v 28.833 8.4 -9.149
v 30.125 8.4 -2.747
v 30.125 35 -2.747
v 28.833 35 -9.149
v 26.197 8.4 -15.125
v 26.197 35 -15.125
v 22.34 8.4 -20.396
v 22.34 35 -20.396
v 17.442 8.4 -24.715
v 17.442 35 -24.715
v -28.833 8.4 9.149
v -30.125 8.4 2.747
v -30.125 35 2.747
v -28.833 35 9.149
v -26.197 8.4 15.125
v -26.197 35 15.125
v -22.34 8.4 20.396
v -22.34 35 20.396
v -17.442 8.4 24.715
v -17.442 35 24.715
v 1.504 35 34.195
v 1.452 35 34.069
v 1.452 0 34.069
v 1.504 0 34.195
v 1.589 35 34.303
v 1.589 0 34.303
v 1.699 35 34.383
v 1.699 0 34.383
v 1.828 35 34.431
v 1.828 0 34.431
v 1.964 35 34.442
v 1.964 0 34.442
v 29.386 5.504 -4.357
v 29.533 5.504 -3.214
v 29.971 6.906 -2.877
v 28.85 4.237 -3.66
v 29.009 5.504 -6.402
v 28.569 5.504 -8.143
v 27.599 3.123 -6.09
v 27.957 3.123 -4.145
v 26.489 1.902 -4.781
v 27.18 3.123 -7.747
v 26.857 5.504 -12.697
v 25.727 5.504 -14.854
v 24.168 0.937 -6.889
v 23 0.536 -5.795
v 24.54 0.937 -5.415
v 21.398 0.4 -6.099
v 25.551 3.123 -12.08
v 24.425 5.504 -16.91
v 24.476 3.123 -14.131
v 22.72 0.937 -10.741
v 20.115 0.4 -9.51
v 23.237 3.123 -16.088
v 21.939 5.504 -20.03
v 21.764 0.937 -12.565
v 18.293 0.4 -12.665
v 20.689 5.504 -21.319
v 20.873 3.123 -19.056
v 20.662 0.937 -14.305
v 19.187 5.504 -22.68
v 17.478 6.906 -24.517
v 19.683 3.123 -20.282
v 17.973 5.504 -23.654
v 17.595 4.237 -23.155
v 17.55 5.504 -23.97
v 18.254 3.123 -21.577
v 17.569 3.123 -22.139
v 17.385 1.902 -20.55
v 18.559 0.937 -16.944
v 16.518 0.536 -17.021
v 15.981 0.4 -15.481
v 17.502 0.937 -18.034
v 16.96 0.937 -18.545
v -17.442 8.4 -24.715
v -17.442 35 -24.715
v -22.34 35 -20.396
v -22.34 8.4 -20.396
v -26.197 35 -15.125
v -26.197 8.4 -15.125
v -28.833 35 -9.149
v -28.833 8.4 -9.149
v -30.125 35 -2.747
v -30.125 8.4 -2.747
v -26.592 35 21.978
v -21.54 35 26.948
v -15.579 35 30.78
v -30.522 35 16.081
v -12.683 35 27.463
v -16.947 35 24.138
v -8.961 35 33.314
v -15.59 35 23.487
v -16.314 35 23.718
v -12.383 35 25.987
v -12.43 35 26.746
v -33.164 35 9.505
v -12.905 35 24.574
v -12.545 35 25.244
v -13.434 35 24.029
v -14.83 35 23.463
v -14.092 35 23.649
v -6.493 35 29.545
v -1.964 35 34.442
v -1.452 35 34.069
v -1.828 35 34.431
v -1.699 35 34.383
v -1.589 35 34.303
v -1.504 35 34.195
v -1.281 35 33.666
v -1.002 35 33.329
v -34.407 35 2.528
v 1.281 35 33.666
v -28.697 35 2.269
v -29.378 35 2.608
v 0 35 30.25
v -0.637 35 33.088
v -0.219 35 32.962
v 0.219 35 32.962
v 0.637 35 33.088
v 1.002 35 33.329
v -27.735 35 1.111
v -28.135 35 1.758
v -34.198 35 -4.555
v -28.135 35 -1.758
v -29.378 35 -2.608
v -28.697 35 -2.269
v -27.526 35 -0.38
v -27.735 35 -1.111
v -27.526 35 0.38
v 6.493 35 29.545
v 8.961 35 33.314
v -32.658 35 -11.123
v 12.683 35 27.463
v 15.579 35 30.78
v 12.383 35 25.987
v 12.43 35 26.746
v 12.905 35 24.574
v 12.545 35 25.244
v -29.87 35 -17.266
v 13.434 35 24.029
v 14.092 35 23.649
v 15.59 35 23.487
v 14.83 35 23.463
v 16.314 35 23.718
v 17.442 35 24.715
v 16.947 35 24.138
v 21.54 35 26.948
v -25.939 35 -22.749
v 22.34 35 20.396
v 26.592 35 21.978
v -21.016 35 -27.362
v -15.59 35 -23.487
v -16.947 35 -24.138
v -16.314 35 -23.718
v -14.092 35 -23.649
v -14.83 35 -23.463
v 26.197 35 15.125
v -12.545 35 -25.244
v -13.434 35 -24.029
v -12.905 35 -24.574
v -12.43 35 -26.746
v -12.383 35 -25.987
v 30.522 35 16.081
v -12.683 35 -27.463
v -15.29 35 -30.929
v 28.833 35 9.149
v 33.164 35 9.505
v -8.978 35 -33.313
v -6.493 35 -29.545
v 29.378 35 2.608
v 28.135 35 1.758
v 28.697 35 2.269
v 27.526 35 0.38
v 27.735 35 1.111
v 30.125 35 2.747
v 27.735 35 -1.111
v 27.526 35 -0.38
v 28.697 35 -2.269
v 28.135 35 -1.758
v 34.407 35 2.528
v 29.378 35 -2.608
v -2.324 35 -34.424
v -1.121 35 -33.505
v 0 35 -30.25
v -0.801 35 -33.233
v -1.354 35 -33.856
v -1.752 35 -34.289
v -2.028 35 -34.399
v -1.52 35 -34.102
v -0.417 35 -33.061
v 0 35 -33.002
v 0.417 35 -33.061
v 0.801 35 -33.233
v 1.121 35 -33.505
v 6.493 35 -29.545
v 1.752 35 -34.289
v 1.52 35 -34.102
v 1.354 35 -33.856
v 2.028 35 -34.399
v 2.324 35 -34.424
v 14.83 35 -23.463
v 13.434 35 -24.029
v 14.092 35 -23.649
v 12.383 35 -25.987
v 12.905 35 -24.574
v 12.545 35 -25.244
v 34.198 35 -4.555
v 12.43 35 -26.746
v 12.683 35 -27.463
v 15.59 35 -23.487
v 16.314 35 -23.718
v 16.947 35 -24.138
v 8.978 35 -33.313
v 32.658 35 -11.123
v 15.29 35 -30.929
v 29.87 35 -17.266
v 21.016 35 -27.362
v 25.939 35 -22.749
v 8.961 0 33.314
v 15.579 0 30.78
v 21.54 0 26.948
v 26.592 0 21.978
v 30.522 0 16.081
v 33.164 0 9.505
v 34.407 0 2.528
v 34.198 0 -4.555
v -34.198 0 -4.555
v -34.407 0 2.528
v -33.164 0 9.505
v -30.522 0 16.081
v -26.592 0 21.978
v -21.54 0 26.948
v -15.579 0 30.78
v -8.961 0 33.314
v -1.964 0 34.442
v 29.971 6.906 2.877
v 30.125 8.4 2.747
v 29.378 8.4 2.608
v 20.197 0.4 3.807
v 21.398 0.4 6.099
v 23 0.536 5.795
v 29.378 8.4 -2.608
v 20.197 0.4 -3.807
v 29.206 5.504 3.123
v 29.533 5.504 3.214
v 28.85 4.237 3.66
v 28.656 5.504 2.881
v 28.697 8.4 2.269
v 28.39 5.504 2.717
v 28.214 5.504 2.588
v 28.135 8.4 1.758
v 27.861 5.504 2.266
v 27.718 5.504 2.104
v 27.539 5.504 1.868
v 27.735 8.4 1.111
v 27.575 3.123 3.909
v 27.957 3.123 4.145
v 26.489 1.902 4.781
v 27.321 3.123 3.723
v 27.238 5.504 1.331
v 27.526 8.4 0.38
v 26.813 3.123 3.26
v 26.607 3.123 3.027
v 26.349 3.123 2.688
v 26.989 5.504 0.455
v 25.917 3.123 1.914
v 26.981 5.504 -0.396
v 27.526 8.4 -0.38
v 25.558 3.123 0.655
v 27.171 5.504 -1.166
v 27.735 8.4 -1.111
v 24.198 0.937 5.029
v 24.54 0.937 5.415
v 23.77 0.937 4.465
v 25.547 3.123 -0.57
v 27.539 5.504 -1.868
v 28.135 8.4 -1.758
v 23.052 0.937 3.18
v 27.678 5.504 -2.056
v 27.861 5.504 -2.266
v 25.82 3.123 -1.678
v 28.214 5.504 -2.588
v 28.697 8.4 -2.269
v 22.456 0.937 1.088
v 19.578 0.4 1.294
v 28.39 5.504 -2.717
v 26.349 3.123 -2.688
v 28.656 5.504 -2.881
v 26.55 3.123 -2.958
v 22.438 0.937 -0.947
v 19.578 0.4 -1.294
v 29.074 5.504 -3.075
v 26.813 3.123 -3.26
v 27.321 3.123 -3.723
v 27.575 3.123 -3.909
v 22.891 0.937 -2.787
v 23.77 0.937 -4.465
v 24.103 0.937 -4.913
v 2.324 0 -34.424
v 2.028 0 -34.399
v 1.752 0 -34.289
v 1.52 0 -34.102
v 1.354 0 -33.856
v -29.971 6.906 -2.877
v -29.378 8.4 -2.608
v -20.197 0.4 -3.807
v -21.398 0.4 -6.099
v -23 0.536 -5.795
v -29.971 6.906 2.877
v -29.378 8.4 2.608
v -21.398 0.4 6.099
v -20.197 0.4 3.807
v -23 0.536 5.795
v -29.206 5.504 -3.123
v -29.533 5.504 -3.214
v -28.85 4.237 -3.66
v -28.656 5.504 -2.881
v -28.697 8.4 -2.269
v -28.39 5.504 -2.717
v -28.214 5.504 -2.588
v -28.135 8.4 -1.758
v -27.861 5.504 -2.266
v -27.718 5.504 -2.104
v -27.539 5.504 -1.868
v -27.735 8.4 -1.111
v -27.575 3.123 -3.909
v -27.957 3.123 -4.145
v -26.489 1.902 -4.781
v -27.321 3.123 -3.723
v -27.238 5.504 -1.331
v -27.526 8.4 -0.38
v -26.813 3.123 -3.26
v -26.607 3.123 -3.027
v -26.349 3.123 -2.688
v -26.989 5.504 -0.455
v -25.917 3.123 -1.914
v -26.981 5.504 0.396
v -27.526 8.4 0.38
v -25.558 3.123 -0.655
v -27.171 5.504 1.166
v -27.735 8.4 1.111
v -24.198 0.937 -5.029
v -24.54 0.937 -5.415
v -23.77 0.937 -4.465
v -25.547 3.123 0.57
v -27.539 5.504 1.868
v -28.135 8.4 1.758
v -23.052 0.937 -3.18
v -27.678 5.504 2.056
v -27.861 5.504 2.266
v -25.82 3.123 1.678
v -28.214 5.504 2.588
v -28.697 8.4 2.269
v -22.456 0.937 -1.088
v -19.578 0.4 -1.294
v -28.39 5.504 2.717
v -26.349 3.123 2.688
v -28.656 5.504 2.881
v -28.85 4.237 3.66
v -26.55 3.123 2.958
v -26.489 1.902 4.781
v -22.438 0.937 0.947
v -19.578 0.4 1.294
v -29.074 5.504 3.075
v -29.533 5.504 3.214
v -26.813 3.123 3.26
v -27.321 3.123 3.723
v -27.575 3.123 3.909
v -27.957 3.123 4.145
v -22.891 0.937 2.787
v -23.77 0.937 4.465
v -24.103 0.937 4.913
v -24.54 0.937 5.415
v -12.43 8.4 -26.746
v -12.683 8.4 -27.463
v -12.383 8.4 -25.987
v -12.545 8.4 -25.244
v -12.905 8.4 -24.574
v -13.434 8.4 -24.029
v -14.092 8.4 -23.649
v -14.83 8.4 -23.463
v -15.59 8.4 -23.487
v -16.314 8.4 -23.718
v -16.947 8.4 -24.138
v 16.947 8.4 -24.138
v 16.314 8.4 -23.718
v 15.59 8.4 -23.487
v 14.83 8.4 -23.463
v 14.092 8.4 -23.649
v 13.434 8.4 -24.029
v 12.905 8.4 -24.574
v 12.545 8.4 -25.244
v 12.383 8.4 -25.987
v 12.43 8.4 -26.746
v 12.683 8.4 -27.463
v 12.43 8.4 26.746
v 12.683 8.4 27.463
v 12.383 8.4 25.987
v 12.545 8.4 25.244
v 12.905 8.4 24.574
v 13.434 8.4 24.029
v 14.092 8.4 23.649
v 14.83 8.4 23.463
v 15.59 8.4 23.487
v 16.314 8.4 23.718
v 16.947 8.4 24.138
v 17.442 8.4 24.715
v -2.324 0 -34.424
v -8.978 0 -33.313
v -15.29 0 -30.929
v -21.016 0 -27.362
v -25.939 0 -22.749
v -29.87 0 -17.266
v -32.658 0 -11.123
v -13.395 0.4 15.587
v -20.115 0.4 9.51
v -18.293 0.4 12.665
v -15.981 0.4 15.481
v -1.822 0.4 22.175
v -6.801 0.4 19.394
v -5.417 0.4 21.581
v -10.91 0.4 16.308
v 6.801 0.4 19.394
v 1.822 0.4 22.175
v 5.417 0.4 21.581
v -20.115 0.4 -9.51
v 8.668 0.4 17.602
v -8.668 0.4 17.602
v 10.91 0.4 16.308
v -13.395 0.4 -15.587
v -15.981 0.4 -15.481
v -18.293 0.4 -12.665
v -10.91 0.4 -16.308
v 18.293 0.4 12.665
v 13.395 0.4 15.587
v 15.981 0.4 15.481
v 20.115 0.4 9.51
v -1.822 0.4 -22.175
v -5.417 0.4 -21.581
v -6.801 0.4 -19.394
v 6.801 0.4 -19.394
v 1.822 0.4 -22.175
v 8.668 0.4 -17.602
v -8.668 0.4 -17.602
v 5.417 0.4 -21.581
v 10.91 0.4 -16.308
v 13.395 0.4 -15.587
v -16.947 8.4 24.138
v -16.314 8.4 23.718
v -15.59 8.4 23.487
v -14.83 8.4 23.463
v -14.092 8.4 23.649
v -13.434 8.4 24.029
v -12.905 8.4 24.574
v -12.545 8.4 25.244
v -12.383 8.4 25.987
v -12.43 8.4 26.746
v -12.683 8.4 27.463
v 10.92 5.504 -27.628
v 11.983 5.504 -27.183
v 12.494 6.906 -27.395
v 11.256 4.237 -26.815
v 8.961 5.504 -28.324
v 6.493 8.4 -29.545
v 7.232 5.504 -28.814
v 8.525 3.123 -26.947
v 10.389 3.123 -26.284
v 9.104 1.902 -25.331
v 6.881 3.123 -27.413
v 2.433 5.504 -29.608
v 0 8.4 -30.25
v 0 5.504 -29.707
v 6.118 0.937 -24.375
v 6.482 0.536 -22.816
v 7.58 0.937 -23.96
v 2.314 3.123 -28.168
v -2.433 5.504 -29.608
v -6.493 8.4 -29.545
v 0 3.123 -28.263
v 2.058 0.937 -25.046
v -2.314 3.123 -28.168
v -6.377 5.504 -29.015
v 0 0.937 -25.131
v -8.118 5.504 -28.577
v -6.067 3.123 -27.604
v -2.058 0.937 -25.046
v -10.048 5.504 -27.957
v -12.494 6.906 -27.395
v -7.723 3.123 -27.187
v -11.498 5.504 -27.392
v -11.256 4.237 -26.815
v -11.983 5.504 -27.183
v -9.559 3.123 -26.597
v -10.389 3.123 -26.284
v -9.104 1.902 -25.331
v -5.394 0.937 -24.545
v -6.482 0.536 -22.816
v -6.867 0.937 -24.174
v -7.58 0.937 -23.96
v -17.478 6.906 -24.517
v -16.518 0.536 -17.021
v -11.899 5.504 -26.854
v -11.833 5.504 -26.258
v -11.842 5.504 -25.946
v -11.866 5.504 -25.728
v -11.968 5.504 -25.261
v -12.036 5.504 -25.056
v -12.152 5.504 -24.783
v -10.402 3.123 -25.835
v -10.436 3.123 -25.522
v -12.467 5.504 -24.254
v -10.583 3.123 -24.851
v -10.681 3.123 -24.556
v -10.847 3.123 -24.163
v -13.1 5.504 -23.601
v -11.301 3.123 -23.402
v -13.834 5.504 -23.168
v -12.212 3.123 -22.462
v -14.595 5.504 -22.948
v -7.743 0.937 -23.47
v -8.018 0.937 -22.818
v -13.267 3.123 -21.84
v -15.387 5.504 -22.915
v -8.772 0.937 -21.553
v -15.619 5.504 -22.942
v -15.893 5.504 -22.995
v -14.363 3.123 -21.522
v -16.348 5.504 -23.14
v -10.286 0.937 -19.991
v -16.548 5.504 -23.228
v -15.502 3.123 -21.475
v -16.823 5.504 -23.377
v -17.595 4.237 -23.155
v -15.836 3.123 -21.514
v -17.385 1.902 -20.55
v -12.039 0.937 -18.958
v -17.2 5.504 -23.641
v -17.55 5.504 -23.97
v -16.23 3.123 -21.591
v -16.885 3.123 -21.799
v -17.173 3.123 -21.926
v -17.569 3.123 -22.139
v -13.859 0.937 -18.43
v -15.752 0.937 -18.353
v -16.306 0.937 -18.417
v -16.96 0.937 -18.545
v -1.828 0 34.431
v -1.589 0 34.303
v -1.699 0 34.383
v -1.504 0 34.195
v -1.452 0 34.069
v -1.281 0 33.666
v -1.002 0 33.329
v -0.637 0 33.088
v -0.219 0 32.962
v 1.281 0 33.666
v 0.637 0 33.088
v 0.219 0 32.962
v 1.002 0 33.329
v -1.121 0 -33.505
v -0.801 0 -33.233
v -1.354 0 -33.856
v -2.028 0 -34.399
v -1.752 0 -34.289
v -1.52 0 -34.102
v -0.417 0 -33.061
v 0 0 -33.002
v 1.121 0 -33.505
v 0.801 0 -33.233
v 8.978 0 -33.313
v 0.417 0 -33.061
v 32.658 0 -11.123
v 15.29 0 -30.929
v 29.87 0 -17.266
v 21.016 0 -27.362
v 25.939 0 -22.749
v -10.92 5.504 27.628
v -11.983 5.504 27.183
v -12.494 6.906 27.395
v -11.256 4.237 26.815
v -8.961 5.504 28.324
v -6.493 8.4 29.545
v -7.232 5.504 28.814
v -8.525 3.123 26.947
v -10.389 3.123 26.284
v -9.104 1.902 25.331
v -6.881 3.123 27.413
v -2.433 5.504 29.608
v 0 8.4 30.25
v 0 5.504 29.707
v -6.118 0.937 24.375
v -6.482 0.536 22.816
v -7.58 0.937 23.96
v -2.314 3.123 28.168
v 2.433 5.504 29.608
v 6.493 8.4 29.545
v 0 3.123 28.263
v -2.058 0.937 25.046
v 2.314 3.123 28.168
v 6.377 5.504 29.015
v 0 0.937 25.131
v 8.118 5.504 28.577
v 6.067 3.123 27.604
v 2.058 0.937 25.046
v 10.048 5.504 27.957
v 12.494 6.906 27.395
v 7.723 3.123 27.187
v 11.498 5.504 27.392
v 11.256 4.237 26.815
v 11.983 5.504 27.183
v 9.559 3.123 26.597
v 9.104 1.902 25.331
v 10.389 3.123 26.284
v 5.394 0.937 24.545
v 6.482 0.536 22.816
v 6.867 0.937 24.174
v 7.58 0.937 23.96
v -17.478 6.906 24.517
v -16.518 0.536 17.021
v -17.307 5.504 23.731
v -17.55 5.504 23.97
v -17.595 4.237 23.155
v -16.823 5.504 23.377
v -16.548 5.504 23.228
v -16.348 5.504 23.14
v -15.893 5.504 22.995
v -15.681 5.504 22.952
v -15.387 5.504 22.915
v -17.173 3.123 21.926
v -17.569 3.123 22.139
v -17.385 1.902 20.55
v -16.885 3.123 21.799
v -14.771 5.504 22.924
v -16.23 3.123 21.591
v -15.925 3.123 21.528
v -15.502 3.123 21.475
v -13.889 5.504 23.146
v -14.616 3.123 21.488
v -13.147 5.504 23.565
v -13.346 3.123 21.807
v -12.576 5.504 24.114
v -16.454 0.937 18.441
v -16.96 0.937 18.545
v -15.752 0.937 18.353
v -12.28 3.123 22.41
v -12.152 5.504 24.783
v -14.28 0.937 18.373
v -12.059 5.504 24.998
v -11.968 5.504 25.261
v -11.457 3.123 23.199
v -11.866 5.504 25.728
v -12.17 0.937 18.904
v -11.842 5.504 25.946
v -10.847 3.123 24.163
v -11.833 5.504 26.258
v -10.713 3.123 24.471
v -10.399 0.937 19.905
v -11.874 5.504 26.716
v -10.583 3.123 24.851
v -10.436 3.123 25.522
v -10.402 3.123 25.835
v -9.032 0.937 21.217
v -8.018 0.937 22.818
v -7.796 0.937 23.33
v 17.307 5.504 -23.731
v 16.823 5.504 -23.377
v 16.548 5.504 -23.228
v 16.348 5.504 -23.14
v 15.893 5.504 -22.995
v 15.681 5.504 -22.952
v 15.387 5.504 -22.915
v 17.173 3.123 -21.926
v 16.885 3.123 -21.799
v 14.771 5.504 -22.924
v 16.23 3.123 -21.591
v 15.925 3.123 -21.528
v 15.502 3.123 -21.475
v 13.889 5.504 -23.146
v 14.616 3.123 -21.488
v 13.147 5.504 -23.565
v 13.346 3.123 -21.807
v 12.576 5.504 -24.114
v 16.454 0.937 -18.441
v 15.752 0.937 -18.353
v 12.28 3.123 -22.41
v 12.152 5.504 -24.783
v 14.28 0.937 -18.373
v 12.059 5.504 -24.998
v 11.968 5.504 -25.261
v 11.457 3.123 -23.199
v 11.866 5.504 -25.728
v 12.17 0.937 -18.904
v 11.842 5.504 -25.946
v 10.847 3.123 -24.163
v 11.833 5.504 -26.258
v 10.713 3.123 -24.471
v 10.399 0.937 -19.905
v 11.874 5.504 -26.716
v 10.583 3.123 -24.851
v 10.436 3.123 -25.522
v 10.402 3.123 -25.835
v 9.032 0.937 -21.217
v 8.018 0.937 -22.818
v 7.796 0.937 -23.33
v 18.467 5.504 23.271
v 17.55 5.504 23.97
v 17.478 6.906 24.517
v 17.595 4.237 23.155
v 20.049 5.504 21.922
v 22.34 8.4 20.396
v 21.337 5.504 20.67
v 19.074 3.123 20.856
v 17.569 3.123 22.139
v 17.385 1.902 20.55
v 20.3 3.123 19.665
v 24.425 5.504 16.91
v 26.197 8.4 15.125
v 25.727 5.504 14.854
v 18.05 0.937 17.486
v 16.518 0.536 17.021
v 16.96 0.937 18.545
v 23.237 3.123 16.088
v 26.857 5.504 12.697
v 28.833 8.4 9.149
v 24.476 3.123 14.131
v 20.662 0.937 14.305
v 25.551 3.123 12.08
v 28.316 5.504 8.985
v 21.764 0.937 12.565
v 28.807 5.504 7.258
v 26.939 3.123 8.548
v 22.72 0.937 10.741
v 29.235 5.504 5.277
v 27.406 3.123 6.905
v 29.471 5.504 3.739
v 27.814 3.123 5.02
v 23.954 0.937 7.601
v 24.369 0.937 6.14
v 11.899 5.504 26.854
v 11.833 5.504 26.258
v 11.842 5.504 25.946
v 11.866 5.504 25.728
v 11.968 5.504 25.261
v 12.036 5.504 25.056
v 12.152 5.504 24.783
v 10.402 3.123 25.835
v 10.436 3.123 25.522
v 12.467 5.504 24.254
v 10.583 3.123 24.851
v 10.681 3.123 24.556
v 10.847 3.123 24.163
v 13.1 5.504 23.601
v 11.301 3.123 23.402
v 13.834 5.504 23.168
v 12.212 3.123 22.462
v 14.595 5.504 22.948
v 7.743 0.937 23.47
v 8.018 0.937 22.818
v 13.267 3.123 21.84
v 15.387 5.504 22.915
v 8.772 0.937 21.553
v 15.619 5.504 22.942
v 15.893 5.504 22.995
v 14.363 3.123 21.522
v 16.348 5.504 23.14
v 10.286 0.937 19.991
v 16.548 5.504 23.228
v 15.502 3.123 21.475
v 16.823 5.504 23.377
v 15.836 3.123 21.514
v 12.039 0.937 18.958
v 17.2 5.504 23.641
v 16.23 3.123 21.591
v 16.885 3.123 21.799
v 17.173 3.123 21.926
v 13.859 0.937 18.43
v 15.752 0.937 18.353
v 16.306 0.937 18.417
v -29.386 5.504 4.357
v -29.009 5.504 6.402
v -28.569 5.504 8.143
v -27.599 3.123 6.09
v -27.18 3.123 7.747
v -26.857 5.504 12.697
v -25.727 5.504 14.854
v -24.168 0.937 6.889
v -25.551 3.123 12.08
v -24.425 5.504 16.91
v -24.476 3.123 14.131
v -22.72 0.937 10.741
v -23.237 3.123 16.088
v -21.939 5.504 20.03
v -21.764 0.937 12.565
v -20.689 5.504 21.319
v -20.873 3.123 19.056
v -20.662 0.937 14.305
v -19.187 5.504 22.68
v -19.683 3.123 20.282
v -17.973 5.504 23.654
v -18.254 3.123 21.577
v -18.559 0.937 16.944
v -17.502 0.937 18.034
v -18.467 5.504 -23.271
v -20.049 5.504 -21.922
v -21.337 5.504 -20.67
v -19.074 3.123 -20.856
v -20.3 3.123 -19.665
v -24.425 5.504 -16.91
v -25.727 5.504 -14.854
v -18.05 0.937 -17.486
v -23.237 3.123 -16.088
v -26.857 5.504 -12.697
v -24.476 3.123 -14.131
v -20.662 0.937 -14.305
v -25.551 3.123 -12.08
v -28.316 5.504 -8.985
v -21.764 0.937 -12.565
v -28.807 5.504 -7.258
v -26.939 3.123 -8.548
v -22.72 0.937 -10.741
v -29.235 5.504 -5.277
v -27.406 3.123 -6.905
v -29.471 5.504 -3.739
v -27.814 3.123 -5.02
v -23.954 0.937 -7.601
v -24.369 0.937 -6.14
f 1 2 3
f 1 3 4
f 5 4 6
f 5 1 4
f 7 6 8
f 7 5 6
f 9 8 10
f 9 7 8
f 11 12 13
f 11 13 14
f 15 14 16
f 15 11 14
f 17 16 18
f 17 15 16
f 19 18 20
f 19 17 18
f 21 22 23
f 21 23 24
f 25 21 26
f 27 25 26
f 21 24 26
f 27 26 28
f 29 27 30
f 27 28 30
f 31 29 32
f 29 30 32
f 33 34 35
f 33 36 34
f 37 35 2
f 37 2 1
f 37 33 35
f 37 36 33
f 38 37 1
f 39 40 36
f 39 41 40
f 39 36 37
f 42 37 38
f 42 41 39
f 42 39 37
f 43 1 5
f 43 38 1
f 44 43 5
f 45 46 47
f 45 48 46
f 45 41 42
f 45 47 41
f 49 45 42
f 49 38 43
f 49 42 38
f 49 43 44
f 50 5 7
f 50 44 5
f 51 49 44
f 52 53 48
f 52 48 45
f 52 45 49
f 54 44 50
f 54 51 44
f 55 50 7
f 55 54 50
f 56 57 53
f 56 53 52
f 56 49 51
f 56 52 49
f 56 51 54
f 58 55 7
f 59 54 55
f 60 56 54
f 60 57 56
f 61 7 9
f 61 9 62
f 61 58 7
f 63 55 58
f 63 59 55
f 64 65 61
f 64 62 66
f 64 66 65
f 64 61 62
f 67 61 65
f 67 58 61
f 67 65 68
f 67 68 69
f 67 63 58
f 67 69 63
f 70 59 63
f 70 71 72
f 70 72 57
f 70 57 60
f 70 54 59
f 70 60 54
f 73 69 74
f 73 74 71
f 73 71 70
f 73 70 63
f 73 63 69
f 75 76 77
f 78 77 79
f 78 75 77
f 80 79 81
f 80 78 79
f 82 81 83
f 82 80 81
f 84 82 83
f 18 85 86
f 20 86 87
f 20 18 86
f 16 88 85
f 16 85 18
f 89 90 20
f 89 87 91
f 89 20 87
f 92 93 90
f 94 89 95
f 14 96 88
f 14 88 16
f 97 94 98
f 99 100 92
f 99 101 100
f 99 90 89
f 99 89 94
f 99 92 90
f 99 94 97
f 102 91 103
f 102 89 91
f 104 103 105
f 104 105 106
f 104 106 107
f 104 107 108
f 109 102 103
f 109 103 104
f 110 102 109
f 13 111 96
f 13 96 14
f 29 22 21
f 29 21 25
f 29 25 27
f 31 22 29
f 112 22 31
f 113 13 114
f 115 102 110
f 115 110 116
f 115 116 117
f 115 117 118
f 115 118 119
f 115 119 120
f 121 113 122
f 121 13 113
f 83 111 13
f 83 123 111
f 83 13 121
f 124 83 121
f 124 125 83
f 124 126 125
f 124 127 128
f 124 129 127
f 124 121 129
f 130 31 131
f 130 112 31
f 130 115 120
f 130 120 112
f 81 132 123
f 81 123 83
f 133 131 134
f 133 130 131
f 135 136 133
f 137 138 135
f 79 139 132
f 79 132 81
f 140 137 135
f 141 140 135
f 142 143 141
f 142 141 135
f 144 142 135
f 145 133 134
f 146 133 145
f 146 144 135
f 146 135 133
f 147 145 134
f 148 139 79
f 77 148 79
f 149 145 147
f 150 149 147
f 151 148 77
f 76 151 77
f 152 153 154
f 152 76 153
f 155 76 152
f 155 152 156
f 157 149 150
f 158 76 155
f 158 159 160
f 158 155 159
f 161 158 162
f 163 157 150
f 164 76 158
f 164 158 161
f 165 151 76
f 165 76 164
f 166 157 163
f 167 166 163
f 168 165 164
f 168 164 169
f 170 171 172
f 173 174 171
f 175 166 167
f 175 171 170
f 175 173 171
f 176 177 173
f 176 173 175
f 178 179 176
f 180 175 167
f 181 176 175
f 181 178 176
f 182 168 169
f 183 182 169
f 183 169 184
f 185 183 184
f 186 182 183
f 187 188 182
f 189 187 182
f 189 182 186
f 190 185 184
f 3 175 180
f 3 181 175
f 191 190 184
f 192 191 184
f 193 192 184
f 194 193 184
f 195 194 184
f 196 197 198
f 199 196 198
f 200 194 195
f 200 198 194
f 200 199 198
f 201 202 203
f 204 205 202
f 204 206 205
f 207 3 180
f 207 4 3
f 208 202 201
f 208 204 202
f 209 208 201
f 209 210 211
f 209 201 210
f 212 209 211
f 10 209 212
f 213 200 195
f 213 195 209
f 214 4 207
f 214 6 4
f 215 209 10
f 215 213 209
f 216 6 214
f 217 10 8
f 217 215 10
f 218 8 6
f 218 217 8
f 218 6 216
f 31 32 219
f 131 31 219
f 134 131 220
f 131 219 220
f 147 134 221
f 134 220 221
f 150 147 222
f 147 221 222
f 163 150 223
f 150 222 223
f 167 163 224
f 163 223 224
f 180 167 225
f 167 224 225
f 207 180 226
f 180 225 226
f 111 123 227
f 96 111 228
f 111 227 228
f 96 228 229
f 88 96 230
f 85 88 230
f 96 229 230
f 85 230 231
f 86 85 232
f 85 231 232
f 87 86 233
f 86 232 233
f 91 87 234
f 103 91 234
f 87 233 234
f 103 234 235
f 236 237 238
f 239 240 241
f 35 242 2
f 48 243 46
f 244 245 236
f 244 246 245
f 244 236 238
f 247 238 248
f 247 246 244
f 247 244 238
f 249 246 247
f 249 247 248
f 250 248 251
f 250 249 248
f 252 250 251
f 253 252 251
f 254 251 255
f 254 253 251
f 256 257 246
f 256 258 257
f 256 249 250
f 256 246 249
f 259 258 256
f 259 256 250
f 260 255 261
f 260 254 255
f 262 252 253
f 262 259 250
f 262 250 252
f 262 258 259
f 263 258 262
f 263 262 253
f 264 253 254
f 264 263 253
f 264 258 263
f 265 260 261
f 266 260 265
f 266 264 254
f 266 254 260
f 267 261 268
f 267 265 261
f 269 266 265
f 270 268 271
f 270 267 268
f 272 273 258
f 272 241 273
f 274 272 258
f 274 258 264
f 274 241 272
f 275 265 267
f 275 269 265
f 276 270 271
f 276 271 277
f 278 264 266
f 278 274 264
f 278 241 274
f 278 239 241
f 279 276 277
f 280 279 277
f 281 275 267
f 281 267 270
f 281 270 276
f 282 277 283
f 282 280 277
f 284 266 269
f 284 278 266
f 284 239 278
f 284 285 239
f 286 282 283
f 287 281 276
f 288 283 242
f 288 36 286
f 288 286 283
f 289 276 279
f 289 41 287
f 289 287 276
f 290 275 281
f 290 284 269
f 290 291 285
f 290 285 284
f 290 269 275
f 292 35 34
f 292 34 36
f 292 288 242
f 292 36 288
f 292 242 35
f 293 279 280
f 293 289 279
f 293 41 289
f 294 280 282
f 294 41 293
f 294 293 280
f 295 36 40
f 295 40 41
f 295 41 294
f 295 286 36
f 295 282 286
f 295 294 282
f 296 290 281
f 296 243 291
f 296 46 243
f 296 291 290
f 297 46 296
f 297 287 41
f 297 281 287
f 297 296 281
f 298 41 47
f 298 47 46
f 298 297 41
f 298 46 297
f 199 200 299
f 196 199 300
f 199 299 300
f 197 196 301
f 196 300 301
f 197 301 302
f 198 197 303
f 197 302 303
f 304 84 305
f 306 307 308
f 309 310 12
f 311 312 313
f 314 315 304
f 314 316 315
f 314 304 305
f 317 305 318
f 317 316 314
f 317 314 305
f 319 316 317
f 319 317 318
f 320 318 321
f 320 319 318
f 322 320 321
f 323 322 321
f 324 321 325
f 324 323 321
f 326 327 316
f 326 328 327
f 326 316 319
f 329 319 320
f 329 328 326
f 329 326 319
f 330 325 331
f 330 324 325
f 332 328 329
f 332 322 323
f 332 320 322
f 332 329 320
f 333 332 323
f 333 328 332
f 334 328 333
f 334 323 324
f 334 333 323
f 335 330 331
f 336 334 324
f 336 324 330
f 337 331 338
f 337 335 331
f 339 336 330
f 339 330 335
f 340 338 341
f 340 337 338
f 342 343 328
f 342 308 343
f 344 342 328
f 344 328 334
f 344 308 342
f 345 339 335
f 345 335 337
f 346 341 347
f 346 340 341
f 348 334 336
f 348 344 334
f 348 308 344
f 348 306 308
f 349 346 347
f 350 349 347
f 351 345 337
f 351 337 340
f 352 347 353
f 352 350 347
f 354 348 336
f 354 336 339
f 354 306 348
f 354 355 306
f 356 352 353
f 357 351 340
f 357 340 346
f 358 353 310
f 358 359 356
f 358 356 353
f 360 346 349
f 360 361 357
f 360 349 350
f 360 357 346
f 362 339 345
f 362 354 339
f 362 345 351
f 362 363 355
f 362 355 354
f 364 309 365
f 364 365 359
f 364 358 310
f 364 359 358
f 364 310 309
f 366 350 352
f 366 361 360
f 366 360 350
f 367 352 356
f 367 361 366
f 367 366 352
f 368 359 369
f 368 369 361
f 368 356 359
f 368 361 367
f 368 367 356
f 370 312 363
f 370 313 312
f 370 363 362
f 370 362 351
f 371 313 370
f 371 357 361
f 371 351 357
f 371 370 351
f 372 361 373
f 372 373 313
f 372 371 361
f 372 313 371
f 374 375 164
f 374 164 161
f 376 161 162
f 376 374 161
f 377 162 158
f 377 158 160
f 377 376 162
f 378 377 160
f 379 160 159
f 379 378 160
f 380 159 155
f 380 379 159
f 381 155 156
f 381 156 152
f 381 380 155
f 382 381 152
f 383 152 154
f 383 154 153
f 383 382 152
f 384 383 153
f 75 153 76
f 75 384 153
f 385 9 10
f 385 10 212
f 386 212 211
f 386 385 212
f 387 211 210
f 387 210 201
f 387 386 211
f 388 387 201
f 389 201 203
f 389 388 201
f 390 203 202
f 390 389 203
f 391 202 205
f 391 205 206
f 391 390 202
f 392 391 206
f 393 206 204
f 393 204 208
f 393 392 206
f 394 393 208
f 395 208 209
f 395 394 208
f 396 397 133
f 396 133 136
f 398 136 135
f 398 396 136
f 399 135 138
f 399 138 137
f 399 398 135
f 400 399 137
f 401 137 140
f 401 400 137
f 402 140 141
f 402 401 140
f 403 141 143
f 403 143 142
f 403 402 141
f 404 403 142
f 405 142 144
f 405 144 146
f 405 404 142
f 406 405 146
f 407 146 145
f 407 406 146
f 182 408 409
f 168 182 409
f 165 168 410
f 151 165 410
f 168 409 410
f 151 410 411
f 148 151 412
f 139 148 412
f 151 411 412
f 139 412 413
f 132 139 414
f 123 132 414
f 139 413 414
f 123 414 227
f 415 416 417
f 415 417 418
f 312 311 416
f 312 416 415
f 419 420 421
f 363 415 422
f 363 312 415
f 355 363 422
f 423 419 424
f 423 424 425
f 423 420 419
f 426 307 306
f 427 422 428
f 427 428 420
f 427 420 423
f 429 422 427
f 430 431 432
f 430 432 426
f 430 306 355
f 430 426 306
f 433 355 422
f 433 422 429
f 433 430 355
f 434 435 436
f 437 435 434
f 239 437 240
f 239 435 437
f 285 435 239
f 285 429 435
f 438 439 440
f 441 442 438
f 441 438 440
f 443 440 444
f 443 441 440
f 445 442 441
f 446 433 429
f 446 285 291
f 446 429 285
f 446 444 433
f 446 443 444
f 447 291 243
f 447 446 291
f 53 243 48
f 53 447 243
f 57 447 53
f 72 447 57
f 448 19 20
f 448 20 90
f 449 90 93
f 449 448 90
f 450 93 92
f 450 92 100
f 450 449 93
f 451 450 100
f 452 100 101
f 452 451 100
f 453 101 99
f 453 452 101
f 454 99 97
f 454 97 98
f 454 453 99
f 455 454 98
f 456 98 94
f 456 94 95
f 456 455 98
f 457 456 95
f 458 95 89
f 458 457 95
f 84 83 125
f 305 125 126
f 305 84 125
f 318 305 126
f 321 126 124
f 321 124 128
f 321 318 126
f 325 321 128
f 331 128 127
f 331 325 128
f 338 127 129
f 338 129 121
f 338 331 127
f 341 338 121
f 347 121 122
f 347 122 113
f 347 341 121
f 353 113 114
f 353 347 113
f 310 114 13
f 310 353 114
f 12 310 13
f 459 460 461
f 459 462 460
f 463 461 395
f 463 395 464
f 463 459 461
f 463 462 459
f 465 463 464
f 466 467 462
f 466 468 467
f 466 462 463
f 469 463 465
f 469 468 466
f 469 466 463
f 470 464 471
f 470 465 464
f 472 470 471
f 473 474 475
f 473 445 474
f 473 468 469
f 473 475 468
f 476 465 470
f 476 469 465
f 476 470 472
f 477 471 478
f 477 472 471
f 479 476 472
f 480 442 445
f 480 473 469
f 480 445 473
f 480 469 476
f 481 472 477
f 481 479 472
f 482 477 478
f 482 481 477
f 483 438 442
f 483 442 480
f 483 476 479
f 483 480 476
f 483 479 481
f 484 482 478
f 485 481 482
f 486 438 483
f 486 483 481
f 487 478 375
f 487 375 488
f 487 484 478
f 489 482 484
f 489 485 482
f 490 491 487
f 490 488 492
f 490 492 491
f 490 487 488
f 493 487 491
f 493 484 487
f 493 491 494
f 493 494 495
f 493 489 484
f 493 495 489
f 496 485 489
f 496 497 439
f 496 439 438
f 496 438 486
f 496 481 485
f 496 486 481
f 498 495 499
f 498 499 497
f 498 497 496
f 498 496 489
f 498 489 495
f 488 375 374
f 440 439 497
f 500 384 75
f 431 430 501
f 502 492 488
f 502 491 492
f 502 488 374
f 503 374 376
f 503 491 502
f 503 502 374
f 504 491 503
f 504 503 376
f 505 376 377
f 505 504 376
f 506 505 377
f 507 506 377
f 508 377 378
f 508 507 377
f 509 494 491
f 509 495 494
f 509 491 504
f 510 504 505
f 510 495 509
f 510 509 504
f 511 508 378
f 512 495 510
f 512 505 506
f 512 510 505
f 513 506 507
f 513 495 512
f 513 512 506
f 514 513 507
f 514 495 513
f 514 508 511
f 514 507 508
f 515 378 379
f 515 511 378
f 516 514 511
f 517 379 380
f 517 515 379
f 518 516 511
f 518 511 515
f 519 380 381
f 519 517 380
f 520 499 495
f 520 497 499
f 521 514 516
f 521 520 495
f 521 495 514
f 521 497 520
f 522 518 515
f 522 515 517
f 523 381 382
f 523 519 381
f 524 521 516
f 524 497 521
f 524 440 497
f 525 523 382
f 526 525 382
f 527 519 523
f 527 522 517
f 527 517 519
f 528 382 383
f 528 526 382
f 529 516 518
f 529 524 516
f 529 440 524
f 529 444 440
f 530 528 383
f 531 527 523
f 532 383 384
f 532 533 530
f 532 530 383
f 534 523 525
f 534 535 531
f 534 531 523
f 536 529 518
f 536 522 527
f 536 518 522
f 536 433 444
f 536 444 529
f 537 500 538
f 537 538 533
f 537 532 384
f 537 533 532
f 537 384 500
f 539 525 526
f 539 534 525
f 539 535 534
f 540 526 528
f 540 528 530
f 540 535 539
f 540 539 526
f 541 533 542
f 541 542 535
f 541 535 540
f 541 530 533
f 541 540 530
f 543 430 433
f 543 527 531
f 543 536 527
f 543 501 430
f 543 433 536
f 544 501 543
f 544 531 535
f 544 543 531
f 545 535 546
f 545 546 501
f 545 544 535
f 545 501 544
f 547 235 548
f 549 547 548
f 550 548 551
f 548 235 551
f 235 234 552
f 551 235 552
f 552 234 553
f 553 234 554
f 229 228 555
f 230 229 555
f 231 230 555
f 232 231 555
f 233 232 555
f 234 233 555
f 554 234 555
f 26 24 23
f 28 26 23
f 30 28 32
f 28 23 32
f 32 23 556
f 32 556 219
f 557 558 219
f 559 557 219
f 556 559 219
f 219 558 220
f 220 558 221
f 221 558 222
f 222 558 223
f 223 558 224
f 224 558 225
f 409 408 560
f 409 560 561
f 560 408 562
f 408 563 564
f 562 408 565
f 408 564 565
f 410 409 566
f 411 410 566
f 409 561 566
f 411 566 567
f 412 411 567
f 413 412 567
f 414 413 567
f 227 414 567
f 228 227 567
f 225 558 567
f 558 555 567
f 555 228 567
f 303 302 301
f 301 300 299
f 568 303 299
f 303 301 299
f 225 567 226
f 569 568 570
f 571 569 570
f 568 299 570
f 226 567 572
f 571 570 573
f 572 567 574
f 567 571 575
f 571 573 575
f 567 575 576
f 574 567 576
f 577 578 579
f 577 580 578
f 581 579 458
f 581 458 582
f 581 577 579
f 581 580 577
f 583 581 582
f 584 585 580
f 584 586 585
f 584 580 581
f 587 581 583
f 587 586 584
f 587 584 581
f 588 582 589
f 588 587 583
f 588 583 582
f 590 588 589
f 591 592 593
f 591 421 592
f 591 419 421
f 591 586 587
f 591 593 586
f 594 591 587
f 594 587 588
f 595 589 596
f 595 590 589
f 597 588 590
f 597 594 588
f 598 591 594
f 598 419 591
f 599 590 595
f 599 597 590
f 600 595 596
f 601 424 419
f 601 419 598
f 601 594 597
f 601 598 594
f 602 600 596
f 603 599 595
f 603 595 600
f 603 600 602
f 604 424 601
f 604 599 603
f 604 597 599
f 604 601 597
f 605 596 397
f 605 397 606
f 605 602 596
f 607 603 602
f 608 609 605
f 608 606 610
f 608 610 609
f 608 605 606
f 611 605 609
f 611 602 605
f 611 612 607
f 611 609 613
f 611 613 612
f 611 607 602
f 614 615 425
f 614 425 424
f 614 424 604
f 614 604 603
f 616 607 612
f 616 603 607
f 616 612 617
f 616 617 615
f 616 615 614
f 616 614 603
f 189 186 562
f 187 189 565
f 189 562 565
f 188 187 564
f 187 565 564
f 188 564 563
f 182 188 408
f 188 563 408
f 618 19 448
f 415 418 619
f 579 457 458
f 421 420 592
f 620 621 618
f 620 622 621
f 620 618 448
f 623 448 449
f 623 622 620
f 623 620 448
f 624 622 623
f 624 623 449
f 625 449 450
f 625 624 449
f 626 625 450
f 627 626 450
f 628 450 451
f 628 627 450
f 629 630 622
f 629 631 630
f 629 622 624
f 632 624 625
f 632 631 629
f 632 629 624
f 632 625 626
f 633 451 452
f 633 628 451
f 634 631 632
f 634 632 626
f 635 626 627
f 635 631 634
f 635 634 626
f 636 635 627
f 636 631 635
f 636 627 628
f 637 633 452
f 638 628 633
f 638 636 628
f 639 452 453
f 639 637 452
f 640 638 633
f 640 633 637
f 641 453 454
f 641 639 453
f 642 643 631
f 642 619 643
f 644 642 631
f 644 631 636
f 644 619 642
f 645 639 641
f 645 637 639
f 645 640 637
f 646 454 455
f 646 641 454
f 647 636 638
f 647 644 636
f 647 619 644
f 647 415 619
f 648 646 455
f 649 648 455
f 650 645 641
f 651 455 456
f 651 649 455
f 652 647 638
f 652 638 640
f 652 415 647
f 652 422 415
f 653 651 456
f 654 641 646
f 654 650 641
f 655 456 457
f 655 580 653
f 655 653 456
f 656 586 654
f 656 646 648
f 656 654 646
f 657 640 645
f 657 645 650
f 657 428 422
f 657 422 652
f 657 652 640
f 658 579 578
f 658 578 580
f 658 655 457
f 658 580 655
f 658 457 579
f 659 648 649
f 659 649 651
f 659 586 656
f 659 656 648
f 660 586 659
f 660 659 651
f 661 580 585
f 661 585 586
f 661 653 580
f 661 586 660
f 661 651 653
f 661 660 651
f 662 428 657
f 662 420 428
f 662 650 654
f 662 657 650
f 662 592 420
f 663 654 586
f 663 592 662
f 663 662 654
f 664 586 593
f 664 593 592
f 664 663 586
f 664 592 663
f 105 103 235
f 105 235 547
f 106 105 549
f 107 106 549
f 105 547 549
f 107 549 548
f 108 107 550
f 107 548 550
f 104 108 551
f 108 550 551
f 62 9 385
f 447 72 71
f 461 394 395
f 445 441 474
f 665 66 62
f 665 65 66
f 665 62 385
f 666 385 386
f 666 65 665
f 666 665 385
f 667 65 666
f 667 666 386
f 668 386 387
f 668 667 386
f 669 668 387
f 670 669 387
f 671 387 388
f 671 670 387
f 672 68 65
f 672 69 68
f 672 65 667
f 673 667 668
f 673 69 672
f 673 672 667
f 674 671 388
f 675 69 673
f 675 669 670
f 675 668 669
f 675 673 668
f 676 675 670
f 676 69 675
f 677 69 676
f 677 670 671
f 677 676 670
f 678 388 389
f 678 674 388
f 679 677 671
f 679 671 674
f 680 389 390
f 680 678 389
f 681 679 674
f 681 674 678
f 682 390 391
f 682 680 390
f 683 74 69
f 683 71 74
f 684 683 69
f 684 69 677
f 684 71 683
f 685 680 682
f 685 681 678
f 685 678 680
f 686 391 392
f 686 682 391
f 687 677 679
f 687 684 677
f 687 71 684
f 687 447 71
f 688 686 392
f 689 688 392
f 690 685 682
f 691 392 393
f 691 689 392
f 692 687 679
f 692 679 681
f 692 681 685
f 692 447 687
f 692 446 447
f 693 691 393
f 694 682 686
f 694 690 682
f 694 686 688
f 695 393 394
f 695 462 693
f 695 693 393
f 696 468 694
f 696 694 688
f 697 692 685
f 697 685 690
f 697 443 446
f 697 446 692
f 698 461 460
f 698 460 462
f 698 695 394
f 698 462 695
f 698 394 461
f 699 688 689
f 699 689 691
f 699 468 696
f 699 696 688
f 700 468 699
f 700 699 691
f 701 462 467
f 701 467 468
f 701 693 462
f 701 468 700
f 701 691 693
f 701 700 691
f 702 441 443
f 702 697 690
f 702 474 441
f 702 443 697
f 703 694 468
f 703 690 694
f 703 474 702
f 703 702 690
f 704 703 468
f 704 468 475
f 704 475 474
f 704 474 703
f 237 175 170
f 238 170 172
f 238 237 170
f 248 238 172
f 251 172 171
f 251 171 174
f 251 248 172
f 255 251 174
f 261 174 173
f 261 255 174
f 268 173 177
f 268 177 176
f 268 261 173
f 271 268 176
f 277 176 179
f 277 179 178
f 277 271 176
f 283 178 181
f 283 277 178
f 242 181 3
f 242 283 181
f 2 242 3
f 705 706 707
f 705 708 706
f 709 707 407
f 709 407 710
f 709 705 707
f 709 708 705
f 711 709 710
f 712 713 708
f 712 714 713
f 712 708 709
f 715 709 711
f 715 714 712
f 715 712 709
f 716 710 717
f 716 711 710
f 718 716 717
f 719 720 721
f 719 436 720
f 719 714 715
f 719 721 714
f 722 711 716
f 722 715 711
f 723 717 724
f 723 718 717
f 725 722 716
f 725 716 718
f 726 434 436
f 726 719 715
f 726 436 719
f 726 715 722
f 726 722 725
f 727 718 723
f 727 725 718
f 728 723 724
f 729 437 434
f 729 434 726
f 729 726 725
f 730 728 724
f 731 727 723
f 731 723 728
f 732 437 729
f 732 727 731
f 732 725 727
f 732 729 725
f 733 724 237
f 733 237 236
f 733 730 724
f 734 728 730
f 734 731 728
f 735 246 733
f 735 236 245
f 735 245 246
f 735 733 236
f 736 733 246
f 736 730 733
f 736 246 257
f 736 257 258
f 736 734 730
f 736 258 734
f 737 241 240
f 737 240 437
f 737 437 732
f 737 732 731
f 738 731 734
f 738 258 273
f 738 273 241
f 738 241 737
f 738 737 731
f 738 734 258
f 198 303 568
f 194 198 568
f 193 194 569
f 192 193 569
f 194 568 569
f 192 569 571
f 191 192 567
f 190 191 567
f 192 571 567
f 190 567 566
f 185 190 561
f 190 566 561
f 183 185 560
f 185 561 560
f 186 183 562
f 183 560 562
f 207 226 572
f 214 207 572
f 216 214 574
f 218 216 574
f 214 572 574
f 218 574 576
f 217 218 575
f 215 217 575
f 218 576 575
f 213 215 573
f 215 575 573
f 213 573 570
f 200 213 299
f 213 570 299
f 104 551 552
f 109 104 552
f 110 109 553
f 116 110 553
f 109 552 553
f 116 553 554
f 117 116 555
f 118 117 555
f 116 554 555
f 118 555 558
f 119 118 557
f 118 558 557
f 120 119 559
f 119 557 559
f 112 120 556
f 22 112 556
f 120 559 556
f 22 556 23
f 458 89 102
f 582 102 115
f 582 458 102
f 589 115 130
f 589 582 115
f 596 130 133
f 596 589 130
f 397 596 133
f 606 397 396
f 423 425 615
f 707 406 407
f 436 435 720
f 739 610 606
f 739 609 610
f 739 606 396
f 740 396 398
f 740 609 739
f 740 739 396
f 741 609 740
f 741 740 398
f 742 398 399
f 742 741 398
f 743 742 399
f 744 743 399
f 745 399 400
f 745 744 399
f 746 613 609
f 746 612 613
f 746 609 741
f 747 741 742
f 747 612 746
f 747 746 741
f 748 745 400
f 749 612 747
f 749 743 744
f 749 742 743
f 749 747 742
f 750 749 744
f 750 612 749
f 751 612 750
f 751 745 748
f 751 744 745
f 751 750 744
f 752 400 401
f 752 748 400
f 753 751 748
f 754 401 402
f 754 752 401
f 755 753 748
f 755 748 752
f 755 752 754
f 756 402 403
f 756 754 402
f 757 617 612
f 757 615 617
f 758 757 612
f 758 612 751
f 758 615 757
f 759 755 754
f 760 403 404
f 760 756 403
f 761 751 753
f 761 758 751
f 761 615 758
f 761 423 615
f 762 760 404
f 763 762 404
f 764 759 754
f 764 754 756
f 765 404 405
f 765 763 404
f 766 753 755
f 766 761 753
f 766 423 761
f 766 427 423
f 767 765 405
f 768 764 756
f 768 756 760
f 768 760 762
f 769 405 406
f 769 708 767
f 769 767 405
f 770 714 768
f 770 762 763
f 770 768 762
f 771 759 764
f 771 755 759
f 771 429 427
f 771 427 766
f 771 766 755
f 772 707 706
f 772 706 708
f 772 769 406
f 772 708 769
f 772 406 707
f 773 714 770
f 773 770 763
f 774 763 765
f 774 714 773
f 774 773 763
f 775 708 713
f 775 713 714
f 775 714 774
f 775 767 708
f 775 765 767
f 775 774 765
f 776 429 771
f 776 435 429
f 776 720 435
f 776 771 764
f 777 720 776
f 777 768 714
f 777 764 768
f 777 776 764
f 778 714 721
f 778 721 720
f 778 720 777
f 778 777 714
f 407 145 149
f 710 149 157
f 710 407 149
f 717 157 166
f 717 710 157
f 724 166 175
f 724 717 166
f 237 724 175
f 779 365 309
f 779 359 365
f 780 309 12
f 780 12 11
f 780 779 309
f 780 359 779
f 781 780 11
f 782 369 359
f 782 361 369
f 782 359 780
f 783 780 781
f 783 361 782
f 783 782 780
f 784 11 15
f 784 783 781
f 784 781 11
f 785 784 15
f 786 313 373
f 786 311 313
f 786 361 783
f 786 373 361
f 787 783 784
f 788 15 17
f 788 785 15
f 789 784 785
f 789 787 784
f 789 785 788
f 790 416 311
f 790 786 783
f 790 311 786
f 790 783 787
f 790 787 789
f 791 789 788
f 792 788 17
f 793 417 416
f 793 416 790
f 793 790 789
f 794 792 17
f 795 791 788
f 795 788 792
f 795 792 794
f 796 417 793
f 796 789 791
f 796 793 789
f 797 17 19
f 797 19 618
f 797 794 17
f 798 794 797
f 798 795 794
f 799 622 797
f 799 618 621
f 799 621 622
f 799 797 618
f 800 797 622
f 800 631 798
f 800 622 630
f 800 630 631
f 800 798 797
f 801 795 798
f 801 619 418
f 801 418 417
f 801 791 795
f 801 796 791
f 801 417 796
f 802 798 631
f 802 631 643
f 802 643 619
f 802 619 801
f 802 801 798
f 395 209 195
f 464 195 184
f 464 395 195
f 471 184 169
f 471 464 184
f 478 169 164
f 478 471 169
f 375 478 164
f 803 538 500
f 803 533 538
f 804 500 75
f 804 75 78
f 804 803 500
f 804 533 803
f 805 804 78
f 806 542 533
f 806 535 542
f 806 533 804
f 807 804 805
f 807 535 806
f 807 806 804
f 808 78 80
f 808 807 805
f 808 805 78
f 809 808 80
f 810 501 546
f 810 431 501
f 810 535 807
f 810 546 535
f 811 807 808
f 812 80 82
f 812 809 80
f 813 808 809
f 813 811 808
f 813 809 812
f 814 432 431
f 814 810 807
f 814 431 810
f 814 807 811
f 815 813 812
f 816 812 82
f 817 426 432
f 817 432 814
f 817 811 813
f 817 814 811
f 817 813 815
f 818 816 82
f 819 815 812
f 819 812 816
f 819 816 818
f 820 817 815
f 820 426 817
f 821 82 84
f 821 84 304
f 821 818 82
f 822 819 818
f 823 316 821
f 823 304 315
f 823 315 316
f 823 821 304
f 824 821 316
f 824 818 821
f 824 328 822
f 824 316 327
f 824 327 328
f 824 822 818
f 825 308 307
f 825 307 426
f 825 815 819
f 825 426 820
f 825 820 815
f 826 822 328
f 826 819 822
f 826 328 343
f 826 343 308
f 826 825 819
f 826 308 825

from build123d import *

# Parameters (mm, degrees)
BOSS_EXTRUDE1_DEPTH = 35
CUT_EXTRUDE2_DEPTH  = 36
BOSS_EXTRUDE2_DEPTH = 0.4
FILLET1_R           = 8


with BuildPart() as part:
    # Sketch1 → Boss-Extrude1 (new body)
    with BuildSketch(Plane(origin=(0, 0, 0), x_dir=(1, 0, 0), z_dir=(0, 1, 0))):
        with BuildLine():
            ThreePointArc((1.451818925, -34.068556857), (1.641248992, -34.346908706), (1.964225605, -34.442038138))
            ThreePointArc((1.964225605, -34.442038138), (26.591847487, -21.978073076), (34.198225299, 4.555174015))
            ThreePointArc((34.198225299, 4.555174015), (23.590291339, 25.176355888), (2.324135821, 34.423627607))
            ThreePointArc((2.324135821, 34.423627607), (1.751838249, 34.289058819), (1.354061739, 33.856153382))
            ThreePointArc((1.354061739, 33.856153382), (0, 33.001534515), (-1.354061739, 33.856153382))
            ThreePointArc((-1.354061739, 33.856153382), (-1.751838249, 34.289058819), (-2.324135821, 34.423627607))
            ThreePointArc((-2.324135821, 34.423627607), (-23.590291339, 25.176355888), (-34.198225299, 4.555174015))
            ThreePointArc((-34.198225299, 4.555174015), (-26.591847487, -21.978073076), (-1.964225605, -34.442038138))
            ThreePointArc((-1.964225605, -34.442038138), (-1.641248992, -34.346908706), (-1.451818925, -34.068556857))
            ThreePointArc((-1.451818925, -34.068556857), (0, -32.945679925), (1.451818925, -34.068556857))
        make_face()
        with BuildLine():
            Line((-2.417, 3.787737139), (0, 3.787737139))
            Line((0, 3.787737139), (2.417, 3.787737139))
            ThreePointArc((2.417, 3.787737139), (0, -4.489512172), (-2.417, 3.787737139))
        make_face(mode=Mode.SUBTRACT)
    extrude(amount=BOSS_EXTRUDE1_DEPTH)

    # Sketch2 → Cut-Extrude2 (cut, through all)
    with BuildSketch(Plane(origin=(0, 0, 0), x_dir=(1, 0, 0), z_dir=(0, 1, 0))):
        with BuildLine():
            ThreePointArc((-17.441608289, 24.715436478), (-26.197268464, 15.125), (-30.125, 2.747157622))
            ThreePointArc((-30.125, 2.747157622), (-27.5, 0), (-30.125, -2.747157622))
            ThreePointArc((-30.125, -2.747157622), (-26.197268464, -15.125), (-17.441608289, -24.715436478))
            ThreePointArc((-17.441608289, -24.715436478), (-13.75, -23.815698604), (-12.683391711, -27.4625941))
            ThreePointArc((-12.683391711, -27.4625941), (0, -30.25), (12.683391711, -27.4625941))
            ThreePointArc((12.683391711, -27.4625941), (13.75, -23.815698604), (17.441608289, -24.715436478))
            ThreePointArc((17.441608289, -24.715436478), (26.197268464, -15.125), (30.125, -2.747157622))
            ThreePointArc((30.125, -2.747157622), (27.5, 0), (30.125, 2.747157622))
            ThreePointArc((30.125, 2.747157622), (26.197268464, 15.125), (17.441608289, 24.715436478))
            ThreePointArc((17.441608289, 24.715436478), (13.75, 23.815698604), (12.683391711, 27.4625941))
            ThreePointArc((12.683391711, 27.4625941), (0, 30.25), (-12.683391711, 27.4625941))
            ThreePointArc((-12.683391711, 27.4625941), (-13.75, 23.815698604), (-17.441608289, 24.715436478))
        make_face()
    extrude(amount=CUT_EXTRUDE2_DEPTH, mode=Mode.SUBTRACT)

    # Sketch2<2> → Boss-Extrude2 (add)
    with BuildSketch(Plane(origin=(0, 0, 0), x_dir=(1, 0, 0), z_dir=(0, 1, 0))):
        with BuildLine():
            ThreePointArc((-17.441608289, 24.715436478), (-26.197268464, 15.125), (-30.125, 2.747157622))
            ThreePointArc((-30.125, 2.747157622), (-27.5, 0), (-30.125, -2.747157622))
            ThreePointArc((-30.125, -2.747157622), (-26.197268464, -15.125), (-17.441608289, -24.715436478))
            ThreePointArc((-17.441608289, -24.715436478), (-13.75, -23.815698604), (-12.683391711, -27.4625941))
            ThreePointArc((-12.683391711, -27.4625941), (0, -30.25), (12.683391711, -27.4625941))
            ThreePointArc((12.683391711, -27.4625941), (13.75, -23.815698604), (17.441608289, -24.715436478))
            ThreePointArc((17.441608289, -24.715436478), (26.197268464, -15.125), (30.125, -2.747157622))
            ThreePointArc((30.125, -2.747157622), (27.5, 0), (30.125, 2.747157622))
            ThreePointArc((30.125, 2.747157622), (26.197268464, 15.125), (17.441608289, 24.715436478))
            ThreePointArc((17.441608289, 24.715436478), (13.75, 23.815698604), (12.683391711, 27.4625941))
            ThreePointArc((12.683391711, 27.4625941), (0, 30.25), (-12.683391711, 27.4625941))
            ThreePointArc((-12.683391711, 27.4625941), (-13.75, 23.815698604), (-17.441608289, 24.715436478))
        make_face()
    extrude(amount=BOSS_EXTRUDE2_DEPTH)

    # Fillet1
    fillet1_edges = [part.edges().sort_by_distance(p)[0] for p in [
        (26.197268464, 0.4, 15.125),
        (27.5, 0.4, 0),
        (26.197268464, 0.4, -15.125),
        (13.75, 0.4, -23.815698604),
        (0, 0.4, -30.25),
        (-13.75, 0.4, -23.815698604),
        (-26.197268464, 0.4, -15.125),
        (-27.5, 0.4, 0),
        (-26.197268464, 0.4, 15.125),
        (-13.75, 0.4, 23.815698604),
        (0, 0.4, 30.25),
        (13.75, 0.4, 23.815698604),
    ]]
    fillet(fillet1_edges, radius=FILLET1_R)


solid = part.part
